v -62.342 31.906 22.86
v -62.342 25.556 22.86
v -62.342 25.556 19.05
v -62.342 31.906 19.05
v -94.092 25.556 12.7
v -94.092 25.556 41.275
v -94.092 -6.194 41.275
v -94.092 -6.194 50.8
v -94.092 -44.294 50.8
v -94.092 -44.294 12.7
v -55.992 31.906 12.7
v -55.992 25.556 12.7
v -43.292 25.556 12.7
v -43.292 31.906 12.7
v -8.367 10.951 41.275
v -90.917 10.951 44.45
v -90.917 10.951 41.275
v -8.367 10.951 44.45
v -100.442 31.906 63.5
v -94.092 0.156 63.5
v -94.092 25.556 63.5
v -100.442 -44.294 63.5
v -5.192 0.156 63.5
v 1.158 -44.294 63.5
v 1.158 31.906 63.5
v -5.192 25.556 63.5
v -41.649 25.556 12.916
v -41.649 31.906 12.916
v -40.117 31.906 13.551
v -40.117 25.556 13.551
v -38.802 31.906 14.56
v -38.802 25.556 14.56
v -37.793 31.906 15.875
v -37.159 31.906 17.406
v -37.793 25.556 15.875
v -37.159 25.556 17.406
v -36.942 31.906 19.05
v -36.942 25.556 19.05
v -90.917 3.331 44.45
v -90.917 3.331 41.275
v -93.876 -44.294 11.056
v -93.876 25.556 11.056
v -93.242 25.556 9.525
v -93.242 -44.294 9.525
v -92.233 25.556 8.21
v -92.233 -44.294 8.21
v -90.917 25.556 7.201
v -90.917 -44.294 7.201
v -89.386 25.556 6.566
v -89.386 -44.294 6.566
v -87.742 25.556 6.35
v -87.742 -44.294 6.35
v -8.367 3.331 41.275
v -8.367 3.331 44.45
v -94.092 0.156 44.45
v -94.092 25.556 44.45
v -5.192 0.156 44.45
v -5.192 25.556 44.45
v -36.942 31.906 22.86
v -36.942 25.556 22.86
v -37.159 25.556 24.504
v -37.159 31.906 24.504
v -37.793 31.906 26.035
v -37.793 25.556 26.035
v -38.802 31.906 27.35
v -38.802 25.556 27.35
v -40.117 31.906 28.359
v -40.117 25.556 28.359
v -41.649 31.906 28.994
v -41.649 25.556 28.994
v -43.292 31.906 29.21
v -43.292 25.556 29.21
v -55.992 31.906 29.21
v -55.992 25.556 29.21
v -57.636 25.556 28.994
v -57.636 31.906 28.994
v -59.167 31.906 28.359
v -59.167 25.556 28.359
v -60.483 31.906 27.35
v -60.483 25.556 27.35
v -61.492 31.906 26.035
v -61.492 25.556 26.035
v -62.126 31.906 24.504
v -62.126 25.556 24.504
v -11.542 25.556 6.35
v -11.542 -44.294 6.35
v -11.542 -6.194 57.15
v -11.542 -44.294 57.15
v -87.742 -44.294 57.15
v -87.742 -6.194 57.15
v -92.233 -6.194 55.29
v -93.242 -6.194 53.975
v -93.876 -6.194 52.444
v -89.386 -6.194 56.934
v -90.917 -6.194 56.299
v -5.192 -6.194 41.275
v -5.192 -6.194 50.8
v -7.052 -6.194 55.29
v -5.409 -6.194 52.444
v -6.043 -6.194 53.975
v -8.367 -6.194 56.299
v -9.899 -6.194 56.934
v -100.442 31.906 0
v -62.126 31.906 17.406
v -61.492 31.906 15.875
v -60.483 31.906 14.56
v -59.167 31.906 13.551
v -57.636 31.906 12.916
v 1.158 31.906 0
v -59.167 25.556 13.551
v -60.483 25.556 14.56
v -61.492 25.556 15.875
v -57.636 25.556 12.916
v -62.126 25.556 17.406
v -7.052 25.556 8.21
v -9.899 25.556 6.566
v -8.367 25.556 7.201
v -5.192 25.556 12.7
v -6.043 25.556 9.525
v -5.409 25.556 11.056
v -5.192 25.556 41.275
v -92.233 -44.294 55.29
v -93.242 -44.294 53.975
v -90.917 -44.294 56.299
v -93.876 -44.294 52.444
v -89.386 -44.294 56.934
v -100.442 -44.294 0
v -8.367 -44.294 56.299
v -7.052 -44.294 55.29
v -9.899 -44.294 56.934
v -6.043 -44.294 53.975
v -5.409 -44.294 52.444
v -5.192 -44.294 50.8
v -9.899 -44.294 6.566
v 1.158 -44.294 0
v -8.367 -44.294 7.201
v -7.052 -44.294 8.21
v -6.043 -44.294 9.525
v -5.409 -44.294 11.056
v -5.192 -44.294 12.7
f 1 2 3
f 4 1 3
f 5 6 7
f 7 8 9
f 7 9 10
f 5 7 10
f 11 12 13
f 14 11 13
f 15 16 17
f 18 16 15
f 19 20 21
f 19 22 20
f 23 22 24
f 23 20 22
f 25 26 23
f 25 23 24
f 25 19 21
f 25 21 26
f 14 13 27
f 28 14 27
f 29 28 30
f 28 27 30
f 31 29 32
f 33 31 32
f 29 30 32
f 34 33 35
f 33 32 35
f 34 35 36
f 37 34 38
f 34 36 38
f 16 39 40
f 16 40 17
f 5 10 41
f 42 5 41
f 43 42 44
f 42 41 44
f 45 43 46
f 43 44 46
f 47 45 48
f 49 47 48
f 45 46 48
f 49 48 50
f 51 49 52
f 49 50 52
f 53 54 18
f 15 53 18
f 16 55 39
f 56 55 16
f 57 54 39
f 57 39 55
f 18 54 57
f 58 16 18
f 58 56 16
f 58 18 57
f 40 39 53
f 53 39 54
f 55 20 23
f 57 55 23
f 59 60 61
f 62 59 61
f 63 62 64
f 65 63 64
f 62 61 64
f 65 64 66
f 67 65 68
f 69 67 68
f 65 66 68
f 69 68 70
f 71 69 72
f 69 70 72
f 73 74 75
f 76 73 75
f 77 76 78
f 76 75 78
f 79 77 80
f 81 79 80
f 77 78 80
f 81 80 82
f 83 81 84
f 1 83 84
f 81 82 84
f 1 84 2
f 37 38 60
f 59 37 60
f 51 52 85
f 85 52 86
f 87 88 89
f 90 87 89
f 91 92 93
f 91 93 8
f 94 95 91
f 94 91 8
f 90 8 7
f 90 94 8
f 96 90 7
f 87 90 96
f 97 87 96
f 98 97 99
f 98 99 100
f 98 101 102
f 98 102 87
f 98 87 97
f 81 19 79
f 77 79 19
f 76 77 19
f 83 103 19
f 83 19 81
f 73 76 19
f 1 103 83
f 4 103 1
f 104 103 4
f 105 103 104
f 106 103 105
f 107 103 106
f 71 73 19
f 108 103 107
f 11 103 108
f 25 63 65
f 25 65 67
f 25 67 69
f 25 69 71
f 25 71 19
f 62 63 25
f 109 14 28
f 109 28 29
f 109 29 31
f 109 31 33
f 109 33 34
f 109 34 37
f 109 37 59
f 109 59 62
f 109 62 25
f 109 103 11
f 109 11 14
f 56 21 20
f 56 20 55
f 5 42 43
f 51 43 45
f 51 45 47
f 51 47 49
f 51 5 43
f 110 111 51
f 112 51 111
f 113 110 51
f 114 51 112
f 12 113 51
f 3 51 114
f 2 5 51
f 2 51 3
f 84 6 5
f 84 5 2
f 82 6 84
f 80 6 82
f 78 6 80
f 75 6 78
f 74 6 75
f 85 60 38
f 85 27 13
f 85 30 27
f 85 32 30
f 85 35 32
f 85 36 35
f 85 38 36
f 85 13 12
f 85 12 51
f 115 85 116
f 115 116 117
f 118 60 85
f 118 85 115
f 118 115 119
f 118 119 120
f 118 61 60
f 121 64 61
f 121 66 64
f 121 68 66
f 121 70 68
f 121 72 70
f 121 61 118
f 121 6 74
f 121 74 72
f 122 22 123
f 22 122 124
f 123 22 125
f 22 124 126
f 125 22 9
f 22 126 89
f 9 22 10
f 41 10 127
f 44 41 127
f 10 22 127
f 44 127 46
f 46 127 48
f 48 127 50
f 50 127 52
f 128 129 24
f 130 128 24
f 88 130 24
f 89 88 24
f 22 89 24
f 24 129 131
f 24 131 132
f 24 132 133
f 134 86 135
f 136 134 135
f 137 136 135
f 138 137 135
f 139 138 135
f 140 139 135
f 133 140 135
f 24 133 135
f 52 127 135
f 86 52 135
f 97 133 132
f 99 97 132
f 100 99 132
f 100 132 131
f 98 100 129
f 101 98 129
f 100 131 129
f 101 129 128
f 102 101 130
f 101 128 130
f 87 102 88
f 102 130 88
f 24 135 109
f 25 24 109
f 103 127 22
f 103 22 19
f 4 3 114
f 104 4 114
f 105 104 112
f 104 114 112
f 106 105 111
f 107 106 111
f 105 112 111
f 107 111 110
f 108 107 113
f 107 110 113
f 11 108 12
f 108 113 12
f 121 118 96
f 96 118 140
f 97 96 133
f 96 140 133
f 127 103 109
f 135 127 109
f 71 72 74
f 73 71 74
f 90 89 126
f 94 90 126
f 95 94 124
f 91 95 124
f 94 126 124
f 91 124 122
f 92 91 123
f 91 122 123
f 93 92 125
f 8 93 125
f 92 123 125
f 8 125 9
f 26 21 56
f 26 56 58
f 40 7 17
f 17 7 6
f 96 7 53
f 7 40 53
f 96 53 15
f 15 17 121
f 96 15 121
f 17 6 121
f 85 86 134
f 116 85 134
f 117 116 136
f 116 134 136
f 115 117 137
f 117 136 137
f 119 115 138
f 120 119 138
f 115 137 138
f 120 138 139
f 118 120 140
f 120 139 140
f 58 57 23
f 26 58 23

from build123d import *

# Parameters (mm, degrees)
F0_W      = 101.6
F0_H      = 76.2
F1_DEPTH  = 63.5
F3_DEPTH  = 69.85
F4_W      = 88.9
F4_H      = 25.4
F5_DEPTH  = 25.4
F7_DEPTH  = 25.4
F8_W      = 88.9
F8_H      = 3.175
F9_DEPTH  = 31.75
F10_W     = 88.9
F10_H     = 6.35
F11_DEPTH = 19.05
F12_W     = 82.55
F12_H     = 7.62
F13_DEPTH = 25.4


with BuildPart() as f1:
    # F0 (on Top) → F1 (new body)
    with BuildSketch(Plane.XY):
        with Locations((-49.642408, -6.194344)):
            Rectangle(F0_W, F0_H)
    extrude(amount=F1_DEPTH)

    # F2 (on face) → F3 (cut)
    with BuildSketch(Plane.XZ.offset(44.294344)):
        with BuildLine():
            Line((-11.542408, 57.15), (-87.742408, 57.15))
            ThreePointArc((-87.742408, 57.15), (-92.232536, 55.290128), (-94.092408, 50.8))
            Line((-94.092408, 50.8), (-94.092408, 12.7))
            ThreePointArc((-94.092408, 12.7), (-92.232536, 8.209872), (-87.742408, 6.35))
            Line((-87.742408, 6.35), (-11.542408, 6.35))
            ThreePointArc((-11.542408, 6.35), (-7.05228, 8.209872), (-5.192408, 12.7))
            Line((-5.192408, 12.7), (-5.192408, 50.8))
            ThreePointArc((-5.192408, 50.8), (-7.05228, 55.290128), (-11.542408, 57.15))
        make_face()
    extrude(amount=-F3_DEPTH, mode=Mode.SUBTRACT)

    # F4 (on face) → F5 (cut)
    with BuildSketch(Plane.XY.offset(63.5)):
        with Locations((-49.642408, 12.855656)):
            Rectangle(F4_W, F4_H)
    extrude(amount=-F5_DEPTH, mode=Mode.SUBTRACT)

    # F6 (on face) → F7 (cut)
    with BuildSketch(Plane.XZ.offset(-25.555656)):
        with BuildLine():
            Line((-43.292408, 29.21), (-55.992408, 29.21))
            ThreePointArc((-55.992408, 29.21), (-60.482536, 27.350128), (-62.342408, 22.86))
            Line((-62.342408, 22.86), (-62.342408, 19.05))
            ThreePointArc((-62.342408, 19.05), (-60.482536, 14.559872), (-55.992408, 12.7))
            Line((-55.992408, 12.7), (-43.292408, 12.7))
            ThreePointArc((-43.292408, 12.7), (-38.80228, 14.559872), (-36.942408, 19.05))
            Line((-36.942408, 19.05), (-36.942408, 22.86))
            ThreePointArc((-36.942408, 22.86), (-38.80228, 27.350128), (-43.292408, 29.21))
        make_face()
    extrude(amount=-F7_DEPTH, mode=Mode.SUBTRACT)

    # F8 (on face) → F9 (join)
    with BuildSketch(Plane.XZ.offset(-25.555656)):
        with Locations((-49.642408, 42.8625)):
            Rectangle(F8_W, F8_H)
    extrude(amount=F9_DEPTH)

    # F10 (on face) → F11 (join)
    with BuildSketch(Plane.XY.offset(63.5)):
        with Locations((-49.642408, -3.019344)):
            Rectangle(F10_W, F10_H)
    extrude(amount=-F11_DEPTH)

    # F12 (on face) → F13 (cut)
    with BuildSketch(Plane.XY.offset(44.45)):
        with Locations((-49.642408, 7.140656)):
            Rectangle(F12_W, F12_H)
    extrude(amount=-F13_DEPTH, mode=Mode.SUBTRACT)


solid = f1.part
